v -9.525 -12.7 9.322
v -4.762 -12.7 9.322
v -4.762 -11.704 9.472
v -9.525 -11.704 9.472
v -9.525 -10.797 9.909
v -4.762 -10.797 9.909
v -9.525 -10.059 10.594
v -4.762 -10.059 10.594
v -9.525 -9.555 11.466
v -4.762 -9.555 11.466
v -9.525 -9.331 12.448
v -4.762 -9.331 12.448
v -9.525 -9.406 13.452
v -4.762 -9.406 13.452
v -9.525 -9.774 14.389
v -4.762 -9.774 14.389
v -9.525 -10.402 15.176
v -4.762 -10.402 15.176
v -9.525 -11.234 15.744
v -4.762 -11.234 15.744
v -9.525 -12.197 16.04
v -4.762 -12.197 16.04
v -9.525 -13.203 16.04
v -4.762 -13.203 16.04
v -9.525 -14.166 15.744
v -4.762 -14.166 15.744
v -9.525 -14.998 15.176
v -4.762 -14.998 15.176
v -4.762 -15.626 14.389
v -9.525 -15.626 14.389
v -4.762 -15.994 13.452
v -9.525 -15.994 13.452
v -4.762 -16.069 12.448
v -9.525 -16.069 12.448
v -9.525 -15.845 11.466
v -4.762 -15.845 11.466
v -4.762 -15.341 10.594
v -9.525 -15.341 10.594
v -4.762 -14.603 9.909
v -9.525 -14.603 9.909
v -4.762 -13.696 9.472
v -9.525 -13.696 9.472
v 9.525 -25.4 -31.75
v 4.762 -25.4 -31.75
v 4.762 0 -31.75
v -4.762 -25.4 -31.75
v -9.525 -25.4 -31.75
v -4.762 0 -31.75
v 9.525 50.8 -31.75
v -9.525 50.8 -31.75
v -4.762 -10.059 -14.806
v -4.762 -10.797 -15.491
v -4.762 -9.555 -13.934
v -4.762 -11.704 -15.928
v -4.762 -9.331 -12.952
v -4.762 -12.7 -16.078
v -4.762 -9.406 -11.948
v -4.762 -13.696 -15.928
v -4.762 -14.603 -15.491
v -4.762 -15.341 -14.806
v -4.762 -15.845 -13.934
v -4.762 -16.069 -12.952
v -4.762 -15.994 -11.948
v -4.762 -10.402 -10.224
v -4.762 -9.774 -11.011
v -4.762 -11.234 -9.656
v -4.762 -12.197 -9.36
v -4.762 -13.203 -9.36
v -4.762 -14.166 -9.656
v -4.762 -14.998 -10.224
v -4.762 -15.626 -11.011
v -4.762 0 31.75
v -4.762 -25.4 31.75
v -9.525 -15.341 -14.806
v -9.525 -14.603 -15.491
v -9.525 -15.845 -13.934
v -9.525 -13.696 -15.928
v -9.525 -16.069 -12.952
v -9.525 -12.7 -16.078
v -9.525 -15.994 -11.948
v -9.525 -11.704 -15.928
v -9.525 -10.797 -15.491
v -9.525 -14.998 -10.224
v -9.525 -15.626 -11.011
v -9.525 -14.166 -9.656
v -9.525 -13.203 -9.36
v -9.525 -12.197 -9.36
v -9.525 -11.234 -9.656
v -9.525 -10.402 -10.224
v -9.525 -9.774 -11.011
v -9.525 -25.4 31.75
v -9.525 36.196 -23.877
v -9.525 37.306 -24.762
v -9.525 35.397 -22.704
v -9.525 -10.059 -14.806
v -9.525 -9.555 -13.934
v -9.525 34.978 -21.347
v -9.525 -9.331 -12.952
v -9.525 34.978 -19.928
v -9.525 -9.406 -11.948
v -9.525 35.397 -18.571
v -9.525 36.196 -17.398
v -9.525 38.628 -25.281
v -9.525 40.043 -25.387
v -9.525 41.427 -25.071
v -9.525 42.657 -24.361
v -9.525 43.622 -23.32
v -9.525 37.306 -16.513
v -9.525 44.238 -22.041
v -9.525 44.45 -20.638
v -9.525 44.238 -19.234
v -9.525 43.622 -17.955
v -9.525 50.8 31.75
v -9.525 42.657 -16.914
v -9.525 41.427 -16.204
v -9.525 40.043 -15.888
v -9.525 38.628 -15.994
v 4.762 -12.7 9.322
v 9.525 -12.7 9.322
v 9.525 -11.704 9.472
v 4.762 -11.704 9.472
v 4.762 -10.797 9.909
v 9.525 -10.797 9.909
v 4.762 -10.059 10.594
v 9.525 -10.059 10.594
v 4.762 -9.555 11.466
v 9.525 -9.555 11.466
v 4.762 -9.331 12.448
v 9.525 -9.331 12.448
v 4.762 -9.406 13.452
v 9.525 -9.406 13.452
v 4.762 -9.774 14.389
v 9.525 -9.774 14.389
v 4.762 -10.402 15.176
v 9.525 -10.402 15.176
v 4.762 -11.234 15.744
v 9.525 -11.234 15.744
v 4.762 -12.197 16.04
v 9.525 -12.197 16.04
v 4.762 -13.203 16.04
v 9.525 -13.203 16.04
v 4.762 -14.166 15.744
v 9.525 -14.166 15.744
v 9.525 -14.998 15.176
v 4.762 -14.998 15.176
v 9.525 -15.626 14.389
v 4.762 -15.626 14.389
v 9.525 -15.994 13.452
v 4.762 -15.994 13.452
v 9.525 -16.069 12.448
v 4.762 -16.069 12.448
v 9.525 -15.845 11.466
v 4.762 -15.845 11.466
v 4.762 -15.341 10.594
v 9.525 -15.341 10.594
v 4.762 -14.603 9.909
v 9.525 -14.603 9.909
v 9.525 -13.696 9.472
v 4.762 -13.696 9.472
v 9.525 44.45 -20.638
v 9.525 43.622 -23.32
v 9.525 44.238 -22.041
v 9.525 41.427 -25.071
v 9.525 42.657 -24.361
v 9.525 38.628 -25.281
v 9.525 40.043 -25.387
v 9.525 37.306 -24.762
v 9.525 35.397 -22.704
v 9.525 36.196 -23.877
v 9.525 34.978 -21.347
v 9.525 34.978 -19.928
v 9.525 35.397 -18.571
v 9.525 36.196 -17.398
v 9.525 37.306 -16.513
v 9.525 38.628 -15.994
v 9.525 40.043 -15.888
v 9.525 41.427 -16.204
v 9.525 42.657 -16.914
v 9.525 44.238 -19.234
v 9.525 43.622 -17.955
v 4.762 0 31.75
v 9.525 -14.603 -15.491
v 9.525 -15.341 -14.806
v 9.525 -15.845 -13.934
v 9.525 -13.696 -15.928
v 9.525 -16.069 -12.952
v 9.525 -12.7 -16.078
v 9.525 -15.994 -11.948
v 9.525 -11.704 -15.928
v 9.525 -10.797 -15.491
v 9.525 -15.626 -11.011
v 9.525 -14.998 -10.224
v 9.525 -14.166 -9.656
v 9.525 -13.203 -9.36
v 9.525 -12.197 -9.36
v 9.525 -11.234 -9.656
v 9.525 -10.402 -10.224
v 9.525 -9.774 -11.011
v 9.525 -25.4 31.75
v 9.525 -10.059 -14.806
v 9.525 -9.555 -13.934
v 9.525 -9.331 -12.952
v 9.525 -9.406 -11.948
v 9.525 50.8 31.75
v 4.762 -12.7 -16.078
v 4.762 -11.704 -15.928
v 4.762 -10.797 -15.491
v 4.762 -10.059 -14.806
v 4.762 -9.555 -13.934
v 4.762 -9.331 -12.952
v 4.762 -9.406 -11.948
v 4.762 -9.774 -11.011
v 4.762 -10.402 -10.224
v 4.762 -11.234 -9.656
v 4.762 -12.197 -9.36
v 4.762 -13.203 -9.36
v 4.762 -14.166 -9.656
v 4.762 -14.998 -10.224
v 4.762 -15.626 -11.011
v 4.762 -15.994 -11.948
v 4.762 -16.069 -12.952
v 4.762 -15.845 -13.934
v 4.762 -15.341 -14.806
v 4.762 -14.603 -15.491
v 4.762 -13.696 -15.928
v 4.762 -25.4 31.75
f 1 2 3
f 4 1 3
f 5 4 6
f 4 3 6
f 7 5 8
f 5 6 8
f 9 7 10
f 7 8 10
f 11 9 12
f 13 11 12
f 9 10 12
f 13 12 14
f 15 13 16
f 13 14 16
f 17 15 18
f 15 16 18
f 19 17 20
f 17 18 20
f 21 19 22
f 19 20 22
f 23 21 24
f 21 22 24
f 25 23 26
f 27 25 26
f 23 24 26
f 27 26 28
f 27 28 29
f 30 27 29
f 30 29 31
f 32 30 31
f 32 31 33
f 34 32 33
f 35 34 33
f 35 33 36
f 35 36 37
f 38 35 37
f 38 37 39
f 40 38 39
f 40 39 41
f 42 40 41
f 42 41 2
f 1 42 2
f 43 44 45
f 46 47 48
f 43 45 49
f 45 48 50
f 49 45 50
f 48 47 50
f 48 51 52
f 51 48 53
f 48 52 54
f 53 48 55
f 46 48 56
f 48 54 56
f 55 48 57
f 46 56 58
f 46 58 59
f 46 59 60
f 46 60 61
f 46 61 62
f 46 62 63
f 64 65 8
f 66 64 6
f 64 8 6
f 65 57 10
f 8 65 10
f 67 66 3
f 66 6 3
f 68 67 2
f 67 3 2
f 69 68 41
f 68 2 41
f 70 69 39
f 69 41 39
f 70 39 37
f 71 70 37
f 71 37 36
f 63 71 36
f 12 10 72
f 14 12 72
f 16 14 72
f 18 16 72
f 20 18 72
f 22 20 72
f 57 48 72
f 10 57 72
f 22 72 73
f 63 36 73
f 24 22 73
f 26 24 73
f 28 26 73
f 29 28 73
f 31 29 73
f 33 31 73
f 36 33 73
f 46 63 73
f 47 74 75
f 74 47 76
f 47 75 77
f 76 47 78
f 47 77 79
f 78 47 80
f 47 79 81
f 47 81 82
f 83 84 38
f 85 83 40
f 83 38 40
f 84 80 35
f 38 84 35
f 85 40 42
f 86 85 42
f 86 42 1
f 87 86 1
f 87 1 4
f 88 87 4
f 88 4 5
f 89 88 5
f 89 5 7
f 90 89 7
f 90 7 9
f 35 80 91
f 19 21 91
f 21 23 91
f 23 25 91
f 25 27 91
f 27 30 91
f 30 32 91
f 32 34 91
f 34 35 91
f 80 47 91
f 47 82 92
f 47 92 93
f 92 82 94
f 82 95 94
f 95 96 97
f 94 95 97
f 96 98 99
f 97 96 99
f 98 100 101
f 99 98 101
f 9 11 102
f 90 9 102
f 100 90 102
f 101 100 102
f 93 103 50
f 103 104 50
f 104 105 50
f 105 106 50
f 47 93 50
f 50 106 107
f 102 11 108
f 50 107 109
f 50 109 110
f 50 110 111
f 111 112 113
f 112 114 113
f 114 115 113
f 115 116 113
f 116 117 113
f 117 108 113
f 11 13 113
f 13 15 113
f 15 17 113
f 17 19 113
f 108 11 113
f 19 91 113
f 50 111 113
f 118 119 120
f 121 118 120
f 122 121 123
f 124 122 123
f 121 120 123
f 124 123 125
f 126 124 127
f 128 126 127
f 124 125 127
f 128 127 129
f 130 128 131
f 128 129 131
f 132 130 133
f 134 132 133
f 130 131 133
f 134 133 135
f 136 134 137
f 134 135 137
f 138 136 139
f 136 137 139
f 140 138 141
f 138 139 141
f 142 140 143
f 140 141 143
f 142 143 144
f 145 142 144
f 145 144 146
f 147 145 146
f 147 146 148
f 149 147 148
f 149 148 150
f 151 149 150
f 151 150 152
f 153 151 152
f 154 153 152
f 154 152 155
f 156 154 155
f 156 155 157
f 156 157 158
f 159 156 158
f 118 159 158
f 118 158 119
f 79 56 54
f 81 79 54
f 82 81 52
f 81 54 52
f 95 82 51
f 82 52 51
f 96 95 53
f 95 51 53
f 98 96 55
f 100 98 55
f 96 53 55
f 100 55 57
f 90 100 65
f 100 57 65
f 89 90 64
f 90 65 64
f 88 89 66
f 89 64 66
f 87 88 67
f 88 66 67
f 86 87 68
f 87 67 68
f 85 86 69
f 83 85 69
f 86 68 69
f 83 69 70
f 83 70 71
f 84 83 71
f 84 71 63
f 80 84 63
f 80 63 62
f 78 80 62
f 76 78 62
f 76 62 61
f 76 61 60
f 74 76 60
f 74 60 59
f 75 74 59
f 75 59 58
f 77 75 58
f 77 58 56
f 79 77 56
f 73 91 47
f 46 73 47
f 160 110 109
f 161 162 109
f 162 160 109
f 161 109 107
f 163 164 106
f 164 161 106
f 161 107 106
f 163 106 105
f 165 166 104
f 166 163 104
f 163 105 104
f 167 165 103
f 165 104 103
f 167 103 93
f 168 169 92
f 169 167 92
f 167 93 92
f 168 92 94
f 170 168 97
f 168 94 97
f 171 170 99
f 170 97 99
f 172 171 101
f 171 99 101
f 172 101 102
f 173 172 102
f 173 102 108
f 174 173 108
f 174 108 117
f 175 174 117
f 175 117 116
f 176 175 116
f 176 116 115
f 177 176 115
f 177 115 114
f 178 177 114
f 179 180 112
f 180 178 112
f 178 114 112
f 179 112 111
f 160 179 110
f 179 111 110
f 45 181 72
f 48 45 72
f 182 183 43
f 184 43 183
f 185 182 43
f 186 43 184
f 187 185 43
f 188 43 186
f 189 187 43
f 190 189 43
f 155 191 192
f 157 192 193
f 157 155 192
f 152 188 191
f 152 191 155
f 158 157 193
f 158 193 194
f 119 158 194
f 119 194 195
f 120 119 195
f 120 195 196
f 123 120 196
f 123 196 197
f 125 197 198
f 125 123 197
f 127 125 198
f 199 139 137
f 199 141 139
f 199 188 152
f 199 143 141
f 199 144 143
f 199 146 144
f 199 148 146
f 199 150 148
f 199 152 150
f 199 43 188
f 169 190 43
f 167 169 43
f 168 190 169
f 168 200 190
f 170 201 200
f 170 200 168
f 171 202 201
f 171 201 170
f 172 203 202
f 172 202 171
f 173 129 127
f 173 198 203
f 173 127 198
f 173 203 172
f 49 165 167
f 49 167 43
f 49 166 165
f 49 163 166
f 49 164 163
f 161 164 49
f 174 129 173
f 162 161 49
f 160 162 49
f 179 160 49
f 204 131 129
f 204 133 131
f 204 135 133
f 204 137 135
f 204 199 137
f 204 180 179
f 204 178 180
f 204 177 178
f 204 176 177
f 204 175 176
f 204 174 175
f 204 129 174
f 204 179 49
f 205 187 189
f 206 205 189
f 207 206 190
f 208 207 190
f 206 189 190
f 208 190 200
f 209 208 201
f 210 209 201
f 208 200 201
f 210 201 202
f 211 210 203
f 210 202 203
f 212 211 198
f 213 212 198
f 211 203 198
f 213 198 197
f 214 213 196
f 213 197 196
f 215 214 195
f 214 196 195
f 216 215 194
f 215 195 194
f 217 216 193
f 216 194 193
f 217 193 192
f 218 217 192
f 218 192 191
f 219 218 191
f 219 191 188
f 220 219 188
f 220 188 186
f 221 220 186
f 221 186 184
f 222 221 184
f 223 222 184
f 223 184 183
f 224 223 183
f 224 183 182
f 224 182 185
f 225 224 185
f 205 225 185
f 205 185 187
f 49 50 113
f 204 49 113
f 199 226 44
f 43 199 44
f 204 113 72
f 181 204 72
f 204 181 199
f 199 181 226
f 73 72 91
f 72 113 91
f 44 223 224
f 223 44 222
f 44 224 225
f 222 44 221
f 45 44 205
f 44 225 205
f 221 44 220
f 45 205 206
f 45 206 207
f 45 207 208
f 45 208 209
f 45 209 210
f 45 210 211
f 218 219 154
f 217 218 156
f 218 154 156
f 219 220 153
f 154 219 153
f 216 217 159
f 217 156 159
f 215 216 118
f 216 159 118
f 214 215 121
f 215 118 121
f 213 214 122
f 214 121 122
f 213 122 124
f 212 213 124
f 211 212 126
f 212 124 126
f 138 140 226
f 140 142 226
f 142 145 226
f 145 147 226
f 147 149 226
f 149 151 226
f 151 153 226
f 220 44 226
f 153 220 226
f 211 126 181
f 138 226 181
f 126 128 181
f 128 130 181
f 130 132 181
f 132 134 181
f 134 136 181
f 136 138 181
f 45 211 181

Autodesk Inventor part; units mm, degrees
ref_plane "YZ Plane" through (0, 0, 0) normal (1, 0, 0) x (0, 1, 0)
ref_plane "XZ Plane" through (0, 0, 0) normal (0, 1, 0) x (-1, 0, 0)
ref_plane "XY Plane" through (0, 0, 0) normal (0, 0, 1) x (1, 0, 0)
sketch "Sketch6" plane through (0, 0, 0) normal (1, 0, 0) x (0, 1, 0)
  line L0 (-25.4, 31.75) -> (-25.4, -31.75)
  line L1 (-25.4, -31.75) -> (0, -31.75)
  line L2 (0, -31.75) -> (0, 31.75)
  line L3 (0, 31.75) -> (-25.4, 31.75)
  line L4 (-25.4, 31.75) -> (0, -31.75) construction
  line L5 (-25.4, -31.75) -> (0, 31.75) construction
  line L6 (0, 31.75) -> (0, -31.75)
  line L7 (0, -31.75) -> (50.8, -31.75)
  line L8 (50.8, -31.75) -> (50.8, 31.75)
  line L9 (50.8, 31.75) -> (0, 31.75)
  line L10 (0, 31.75) -> (50.8, -31.75) construction
  line L11 (0, -31.75) -> (50.8, 31.75) construction
  circle A0 centre (39.6875, -20.6375) radius 4.7625
  point P0 (0, 0)
  point P1 (-12.7, 0)
  point P2 (25.4, 0)
  dimension "d12" = 12.7
  dimension "d13" = 25.4
  dimension "d14" = 50.8
  dimension "d15" = 25.4
  dimension "d16" = 9.525
  dimension "d17" = 11.1125
  dimension "d18" = 11.1125
  dimension "d24" = 63.5
extrude "Extrusion3" add sketch "Sketch6" along normal mid plane 19.05
sketch "Sketch7" plane through (-9.525, -25.4, 31.75) normal (0, 0, 1) x (1, 0, 0)
  line L0 (9.525, 25.4) -> (9.525, 0) construction
  line L1 (0, 0) -> (19.05, 0) construction
  line L2 (4.7625, 0) -> (14.2875, 0)
  line L3 (14.2875, 0) -> (14.2875, 25.4)
  line L4 (14.2875, 25.4) -> (4.7625, 25.4)
  line L5 (4.7625, 25.4) -> (4.7625, 0)
  line L6 (4.7625, 0) -> (14.2875, 25.4) construction
  line L7 (14.2875, 0) -> (4.7625, 25.4) construction
  point P0 (9.525, 12.7)
  dimension "d21" = 9.525
extrude "Extrusion4" cut sketch "Sketch7" against normal through all
sketch "Sketch8" plane through (9.525, 0, 0) normal (1, 0, 0) x (0, 0, -1)
  line L0 (31.75, -25.4) -> (31.75, 0) projected
  line L1 (-31.75, -25.4) -> (31.75, -25.4) projected
  line L2 (-31.75, 0) -> (-31.75, -25.4) projected
  line L3 (-31.75, 0) -> (31.75, 0) projected
  line L4 (-292.1, -85.725) -> (-292.1, -12.7) projected
  arc A0 (-292.1, -85.725) -> (-279.4, -98.425) centre (-279.4, -85.725) ccw projected
  line L5 (222.25, -98.425) -> (-279.4, -98.425) projected
  arc A1 (222.25, -98.425) -> (234.95, -85.725) centre (222.25, -85.725) ccw projected
  line L6 (234.95, -81.1401) -> (234.95, -85.725) projected
  arc A2 (234.95, -81.1401) -> (231.6119, -72.5584) centre (222.25, -81.1401) ccw projected
  line L7 (231.6119, -72.5584) -> (168.8751, -4.1183) projected
  arc A3 (168.8751, -4.1183) -> (159.5132, 0) centre (159.5132, -12.7) ccw projected
  line L8 (159.5132, 0) -> (-279.4, 0) projected
  arc A4 (-279.4, 0) -> (-292.1, -12.7) centre (-279.4, -12.7) ccw projected
  circle A5 centre (215.9, -79.375) radius 4.826 projected
  circle A6 centre (-241.3, -79.375) radius 4.826 projected
  circle A7 centre (200.025, -79.375) radius 4.826 projected
  circle A8 centre (182.9995, -40.6685) radius 3.3782 projected
  circle A9 centre (165.1, -85.725) radius 3.3782 projected
  line L9 (-236.5375, -55.8157) -> (-236.5375, -25.4) projected
  arc A10 (-233.3625, -22.225) -> (-236.5375, -25.4) centre (-233.3625, -25.4) ccw projected
  line L10 (-233.3625, -22.225) -> (-210.2431, -22.225) projected
  arc A11 (-207.7154, -27.3213) -> (-210.2431, -22.225) centre (-210.2431, -25.4) ccw projected
  line L11 (-207.7154, -27.3213) -> (-230.8348, -57.737) projected
  arc A12 (-236.5375, -55.8157) -> (-230.8348, -57.737) centre (-233.3625, -55.8157) ccw projected
  line L12 (-229.0307, -71.1037) -> (-201.0846, -34.338) projected
  arc A13 (-195.3819, -36.2593) -> (-201.0846, -34.338) centre (-198.5569, -36.2593) ccw projected
  line L13 (-195.3819, -36.2593) -> (-195.3819, -73.025) projected
  arc A14 (-198.5569, -76.2) -> (-195.3819, -73.025) centre (-198.5569, -73.025) ccw projected
  line L14 (-198.5569, -76.2) -> (-226.503, -76.2) projected
  arc A15 (-229.0307, -71.1037) -> (-226.503, -76.2) centre (-226.503, -73.025) ccw projected
  line L15 (-73.119, -73.025) -> (-73.119, -34.8804) projected
  arc A16 (-67.6008, -32.738) -> (-73.119, -34.8804) centre (-69.944, -34.8804) ccw projected
  line L16 (-67.6008, -32.738) -> (-32.724, -70.8826) projected
  arc A17 (-35.0672, -76.2) -> (-32.724, -70.8826) centre (-35.0672, -73.025) ccw projected
  line L17 (-35.0672, -76.2) -> (-69.944, -76.2) projected
  arc A18 (-73.119, -73.025) -> (-69.944, -76.2) centre (-69.944, -73.025) ccw projected
  line L18 (34.0449, -27.5424) -> (-2.4193, -67.4233) projected
  arc A19 (-7.9375, -65.2808) -> (-2.4193, -67.4233) centre (-4.7625, -65.2808) ccw projected
  line L19 (-7.9375, -65.2808) -> (-7.9375, -25.4) projected
  arc A20 (-4.7625, -22.225) -> (-7.9375, -25.4) centre (-4.7625, -25.4) ccw projected
  line L20 (-4.7625, -22.225) -> (31.7017, -22.225) projected
  arc A21 (34.0449, -27.5424) -> (31.7017, -22.225) centre (31.7017, -25.4) ccw projected
  line L21 (-22.9807, -67.4233) -> (-59.4449, -27.5424) projected
  arc A22 (-57.1017, -22.225) -> (-59.4449, -27.5424) centre (-57.1017, -25.4) ccw projected
  line L22 (-57.1017, -22.225) -> (-20.6375, -22.225) projected
  arc A23 (-17.4625, -25.4) -> (-20.6375, -22.225) centre (-20.6375, -25.4) ccw projected
  line L23 (-17.4625, -25.4) -> (-17.4625, -65.2808) projected
  arc A24 (-22.9807, -67.4233) -> (-17.4625, -65.2808) centre (-20.6375, -65.2808) ccw projected
  line L24 (47.719, -34.8804) -> (47.719, -73.025) projected
  arc A25 (44.544, -76.2) -> (47.719, -73.025) centre (44.544, -73.025) ccw projected
  line L25 (44.544, -76.2) -> (9.6672, -76.2) projected
  arc A26 (7.324, -70.8826) -> (9.6672, -76.2) centre (9.6672, -73.025) ccw projected
  line L26 (7.324, -70.8826) -> (42.2008, -32.738) projected
  arc A27 (47.719, -34.8804) -> (42.2008, -32.738) centre (44.544, -34.8804) ccw projected
  line L27 (84.1375, -25.4) -> (84.1375, -73.025) projected
  arc A28 (80.9625, -76.2) -> (84.1375, -73.025) centre (80.9625, -73.025) ccw projected
  line L28 (80.9625, -76.2) -> (60.419, -76.2) projected
  arc A29 (57.244, -73.025) -> (60.419, -76.2) centre (60.419, -73.025) ccw projected
  line L29 (57.244, -73.025) -> (57.244, -25.4) projected
  arc A30 (60.419, -22.225) -> (57.244, -25.4) centre (60.419, -25.4) ccw projected
  line L30 (60.419, -22.225) -> (80.9625, -22.225) projected
  arc A31 (84.1375, -25.4) -> (80.9625, -22.225) centre (80.9625, -25.4) ccw projected
  line L31 (142.875, -69.85) -> (142.875, -29.1831) projected
  arc A32 (148.4044, -27.053) -> (142.875, -29.1831) centre (146.05, -29.1831) ccw projected
  line L32 (148.4044, -27.053) -> (188.0708, -70.8949) projected
  arc A33 (185.7165, -76.2) -> (188.0708, -70.8949) centre (185.7165, -73.025) ccw projected
  line L33 (185.7165, -76.2) -> (149.225, -76.2) projected
  arc A34 (142.875, -69.85) -> (149.225, -76.2) centre (149.225, -69.85) ccw projected
  circle A35 centre (-173.7792, -57.6072) radius 5.5626 projected
  circle A36 centre (-96.3092, -32.2072) radius 5.5626 projected
  circle A37 centre (-173.7792, -32.2072) radius 5.5626 projected
  circle A38 centre (-96.3092, -57.6072) radius 5.5626 projected
  circle A39 centre (101.6, -28.575) radius 2.5527 projected
  circle A40 centre (111.125, -19.05) radius 2.5527 projected
  circle A41 centre (120.65, -9.525) radius 2.5527 projected
  circle A42 centre (101.6, -88.9) radius 2.5527 projected
  circle A43 centre (120.65, -69.85) radius 2.5527 projected
  circle A44 centre (111.125, -79.375) radius 2.5527 projected
  circle A45 centre (-266.7, -12.7) radius 3.3782 projected
  circle A46 centre (-266.7, -85.725) radius 3.3782 projected
  circle A47 centre (-241.3, -12.7) radius 3.3782 projected
  circle A48 centre (-215.9, -12.7) radius 3.3782 projected
  circle A49 centre (-215.9, -85.725) radius 3.3782 projected
  circle A50 centre (-190.5, -12.7) radius 3.3782 projected
  circle A51 centre (-165.1, -12.7) radius 3.3782 projected
  circle A52 centre (-165.1, -85.725) radius 3.3782 projected
  circle A53 centre (-139.7, -12.7) radius 3.3782 projected
  circle A54 centre (-139.7, -85.725) radius 3.3782 projected
  circle A55 centre (-114.3, -12.7) radius 3.3782 projected
  circle A56 centre (-114.3, -85.725) radius 3.3782 projected
  circle A57 centre (-88.9, -12.7) radius 3.3782 projected
  circle A58 centre (-63.5, -12.7) radius 3.3782 projected
  circle A59 centre (-63.5, -85.725) radius 3.3782 projected
  circle A60 centre (-38.1, -12.7) radius 3.3782 projected
  circle A61 centre (-38.1, -85.725) radius 3.3782 projected
  circle A62 centre (-12.7, -12.7) radius 3.3782 projected
  circle A63 centre (12.7, -12.7) radius 3.3782 projected
  circle A64 centre (12.7, -85.725) radius 3.3782 projected
  circle A65 centre (38.1, -12.7) radius 3.3782 projected
  circle A66 centre (38.1, -85.725) radius 3.3782 projected
  circle A67 centre (63.5, -12.7) radius 3.3782 projected
  circle A68 centre (63.5, -85.725) radius 3.3782 projected
  circle A69 centre (88.9, -12.7) radius 3.3782 projected
  circle A70 centre (88.9, -85.725) radius 3.3782 projected
  circle A71 centre (139.7, -12.7) radius 3.3782 projected
  circle A72 centre (139.7, -85.725) radius 3.3782 projected
  circle A73 centre (161.925, -15.875) radius 4.953 projected
  circle A74 centre (-190.6194, -90.5002) radius 3.3528 projected
  circle A75 centre (-79.469, -90.5002) radius 3.3528 projected
  circle A76 centre (-135.0442, -60.325) radius 14.2812 projected
  circle A77 centre (-12.7, -83.185) radius 4.826 projected
  circle A78 centre (-12.7, -12.7) radius 3.3782
  circle A79 centre (12.7, -12.7) radius 3.3782
  point P0 (0, 0)
extrude "Extrusion5" cut sketch "Sketch8" against normal through all contours A62 | A63
properties part number "WideSupportForLift" material "Aluminum 6061"
